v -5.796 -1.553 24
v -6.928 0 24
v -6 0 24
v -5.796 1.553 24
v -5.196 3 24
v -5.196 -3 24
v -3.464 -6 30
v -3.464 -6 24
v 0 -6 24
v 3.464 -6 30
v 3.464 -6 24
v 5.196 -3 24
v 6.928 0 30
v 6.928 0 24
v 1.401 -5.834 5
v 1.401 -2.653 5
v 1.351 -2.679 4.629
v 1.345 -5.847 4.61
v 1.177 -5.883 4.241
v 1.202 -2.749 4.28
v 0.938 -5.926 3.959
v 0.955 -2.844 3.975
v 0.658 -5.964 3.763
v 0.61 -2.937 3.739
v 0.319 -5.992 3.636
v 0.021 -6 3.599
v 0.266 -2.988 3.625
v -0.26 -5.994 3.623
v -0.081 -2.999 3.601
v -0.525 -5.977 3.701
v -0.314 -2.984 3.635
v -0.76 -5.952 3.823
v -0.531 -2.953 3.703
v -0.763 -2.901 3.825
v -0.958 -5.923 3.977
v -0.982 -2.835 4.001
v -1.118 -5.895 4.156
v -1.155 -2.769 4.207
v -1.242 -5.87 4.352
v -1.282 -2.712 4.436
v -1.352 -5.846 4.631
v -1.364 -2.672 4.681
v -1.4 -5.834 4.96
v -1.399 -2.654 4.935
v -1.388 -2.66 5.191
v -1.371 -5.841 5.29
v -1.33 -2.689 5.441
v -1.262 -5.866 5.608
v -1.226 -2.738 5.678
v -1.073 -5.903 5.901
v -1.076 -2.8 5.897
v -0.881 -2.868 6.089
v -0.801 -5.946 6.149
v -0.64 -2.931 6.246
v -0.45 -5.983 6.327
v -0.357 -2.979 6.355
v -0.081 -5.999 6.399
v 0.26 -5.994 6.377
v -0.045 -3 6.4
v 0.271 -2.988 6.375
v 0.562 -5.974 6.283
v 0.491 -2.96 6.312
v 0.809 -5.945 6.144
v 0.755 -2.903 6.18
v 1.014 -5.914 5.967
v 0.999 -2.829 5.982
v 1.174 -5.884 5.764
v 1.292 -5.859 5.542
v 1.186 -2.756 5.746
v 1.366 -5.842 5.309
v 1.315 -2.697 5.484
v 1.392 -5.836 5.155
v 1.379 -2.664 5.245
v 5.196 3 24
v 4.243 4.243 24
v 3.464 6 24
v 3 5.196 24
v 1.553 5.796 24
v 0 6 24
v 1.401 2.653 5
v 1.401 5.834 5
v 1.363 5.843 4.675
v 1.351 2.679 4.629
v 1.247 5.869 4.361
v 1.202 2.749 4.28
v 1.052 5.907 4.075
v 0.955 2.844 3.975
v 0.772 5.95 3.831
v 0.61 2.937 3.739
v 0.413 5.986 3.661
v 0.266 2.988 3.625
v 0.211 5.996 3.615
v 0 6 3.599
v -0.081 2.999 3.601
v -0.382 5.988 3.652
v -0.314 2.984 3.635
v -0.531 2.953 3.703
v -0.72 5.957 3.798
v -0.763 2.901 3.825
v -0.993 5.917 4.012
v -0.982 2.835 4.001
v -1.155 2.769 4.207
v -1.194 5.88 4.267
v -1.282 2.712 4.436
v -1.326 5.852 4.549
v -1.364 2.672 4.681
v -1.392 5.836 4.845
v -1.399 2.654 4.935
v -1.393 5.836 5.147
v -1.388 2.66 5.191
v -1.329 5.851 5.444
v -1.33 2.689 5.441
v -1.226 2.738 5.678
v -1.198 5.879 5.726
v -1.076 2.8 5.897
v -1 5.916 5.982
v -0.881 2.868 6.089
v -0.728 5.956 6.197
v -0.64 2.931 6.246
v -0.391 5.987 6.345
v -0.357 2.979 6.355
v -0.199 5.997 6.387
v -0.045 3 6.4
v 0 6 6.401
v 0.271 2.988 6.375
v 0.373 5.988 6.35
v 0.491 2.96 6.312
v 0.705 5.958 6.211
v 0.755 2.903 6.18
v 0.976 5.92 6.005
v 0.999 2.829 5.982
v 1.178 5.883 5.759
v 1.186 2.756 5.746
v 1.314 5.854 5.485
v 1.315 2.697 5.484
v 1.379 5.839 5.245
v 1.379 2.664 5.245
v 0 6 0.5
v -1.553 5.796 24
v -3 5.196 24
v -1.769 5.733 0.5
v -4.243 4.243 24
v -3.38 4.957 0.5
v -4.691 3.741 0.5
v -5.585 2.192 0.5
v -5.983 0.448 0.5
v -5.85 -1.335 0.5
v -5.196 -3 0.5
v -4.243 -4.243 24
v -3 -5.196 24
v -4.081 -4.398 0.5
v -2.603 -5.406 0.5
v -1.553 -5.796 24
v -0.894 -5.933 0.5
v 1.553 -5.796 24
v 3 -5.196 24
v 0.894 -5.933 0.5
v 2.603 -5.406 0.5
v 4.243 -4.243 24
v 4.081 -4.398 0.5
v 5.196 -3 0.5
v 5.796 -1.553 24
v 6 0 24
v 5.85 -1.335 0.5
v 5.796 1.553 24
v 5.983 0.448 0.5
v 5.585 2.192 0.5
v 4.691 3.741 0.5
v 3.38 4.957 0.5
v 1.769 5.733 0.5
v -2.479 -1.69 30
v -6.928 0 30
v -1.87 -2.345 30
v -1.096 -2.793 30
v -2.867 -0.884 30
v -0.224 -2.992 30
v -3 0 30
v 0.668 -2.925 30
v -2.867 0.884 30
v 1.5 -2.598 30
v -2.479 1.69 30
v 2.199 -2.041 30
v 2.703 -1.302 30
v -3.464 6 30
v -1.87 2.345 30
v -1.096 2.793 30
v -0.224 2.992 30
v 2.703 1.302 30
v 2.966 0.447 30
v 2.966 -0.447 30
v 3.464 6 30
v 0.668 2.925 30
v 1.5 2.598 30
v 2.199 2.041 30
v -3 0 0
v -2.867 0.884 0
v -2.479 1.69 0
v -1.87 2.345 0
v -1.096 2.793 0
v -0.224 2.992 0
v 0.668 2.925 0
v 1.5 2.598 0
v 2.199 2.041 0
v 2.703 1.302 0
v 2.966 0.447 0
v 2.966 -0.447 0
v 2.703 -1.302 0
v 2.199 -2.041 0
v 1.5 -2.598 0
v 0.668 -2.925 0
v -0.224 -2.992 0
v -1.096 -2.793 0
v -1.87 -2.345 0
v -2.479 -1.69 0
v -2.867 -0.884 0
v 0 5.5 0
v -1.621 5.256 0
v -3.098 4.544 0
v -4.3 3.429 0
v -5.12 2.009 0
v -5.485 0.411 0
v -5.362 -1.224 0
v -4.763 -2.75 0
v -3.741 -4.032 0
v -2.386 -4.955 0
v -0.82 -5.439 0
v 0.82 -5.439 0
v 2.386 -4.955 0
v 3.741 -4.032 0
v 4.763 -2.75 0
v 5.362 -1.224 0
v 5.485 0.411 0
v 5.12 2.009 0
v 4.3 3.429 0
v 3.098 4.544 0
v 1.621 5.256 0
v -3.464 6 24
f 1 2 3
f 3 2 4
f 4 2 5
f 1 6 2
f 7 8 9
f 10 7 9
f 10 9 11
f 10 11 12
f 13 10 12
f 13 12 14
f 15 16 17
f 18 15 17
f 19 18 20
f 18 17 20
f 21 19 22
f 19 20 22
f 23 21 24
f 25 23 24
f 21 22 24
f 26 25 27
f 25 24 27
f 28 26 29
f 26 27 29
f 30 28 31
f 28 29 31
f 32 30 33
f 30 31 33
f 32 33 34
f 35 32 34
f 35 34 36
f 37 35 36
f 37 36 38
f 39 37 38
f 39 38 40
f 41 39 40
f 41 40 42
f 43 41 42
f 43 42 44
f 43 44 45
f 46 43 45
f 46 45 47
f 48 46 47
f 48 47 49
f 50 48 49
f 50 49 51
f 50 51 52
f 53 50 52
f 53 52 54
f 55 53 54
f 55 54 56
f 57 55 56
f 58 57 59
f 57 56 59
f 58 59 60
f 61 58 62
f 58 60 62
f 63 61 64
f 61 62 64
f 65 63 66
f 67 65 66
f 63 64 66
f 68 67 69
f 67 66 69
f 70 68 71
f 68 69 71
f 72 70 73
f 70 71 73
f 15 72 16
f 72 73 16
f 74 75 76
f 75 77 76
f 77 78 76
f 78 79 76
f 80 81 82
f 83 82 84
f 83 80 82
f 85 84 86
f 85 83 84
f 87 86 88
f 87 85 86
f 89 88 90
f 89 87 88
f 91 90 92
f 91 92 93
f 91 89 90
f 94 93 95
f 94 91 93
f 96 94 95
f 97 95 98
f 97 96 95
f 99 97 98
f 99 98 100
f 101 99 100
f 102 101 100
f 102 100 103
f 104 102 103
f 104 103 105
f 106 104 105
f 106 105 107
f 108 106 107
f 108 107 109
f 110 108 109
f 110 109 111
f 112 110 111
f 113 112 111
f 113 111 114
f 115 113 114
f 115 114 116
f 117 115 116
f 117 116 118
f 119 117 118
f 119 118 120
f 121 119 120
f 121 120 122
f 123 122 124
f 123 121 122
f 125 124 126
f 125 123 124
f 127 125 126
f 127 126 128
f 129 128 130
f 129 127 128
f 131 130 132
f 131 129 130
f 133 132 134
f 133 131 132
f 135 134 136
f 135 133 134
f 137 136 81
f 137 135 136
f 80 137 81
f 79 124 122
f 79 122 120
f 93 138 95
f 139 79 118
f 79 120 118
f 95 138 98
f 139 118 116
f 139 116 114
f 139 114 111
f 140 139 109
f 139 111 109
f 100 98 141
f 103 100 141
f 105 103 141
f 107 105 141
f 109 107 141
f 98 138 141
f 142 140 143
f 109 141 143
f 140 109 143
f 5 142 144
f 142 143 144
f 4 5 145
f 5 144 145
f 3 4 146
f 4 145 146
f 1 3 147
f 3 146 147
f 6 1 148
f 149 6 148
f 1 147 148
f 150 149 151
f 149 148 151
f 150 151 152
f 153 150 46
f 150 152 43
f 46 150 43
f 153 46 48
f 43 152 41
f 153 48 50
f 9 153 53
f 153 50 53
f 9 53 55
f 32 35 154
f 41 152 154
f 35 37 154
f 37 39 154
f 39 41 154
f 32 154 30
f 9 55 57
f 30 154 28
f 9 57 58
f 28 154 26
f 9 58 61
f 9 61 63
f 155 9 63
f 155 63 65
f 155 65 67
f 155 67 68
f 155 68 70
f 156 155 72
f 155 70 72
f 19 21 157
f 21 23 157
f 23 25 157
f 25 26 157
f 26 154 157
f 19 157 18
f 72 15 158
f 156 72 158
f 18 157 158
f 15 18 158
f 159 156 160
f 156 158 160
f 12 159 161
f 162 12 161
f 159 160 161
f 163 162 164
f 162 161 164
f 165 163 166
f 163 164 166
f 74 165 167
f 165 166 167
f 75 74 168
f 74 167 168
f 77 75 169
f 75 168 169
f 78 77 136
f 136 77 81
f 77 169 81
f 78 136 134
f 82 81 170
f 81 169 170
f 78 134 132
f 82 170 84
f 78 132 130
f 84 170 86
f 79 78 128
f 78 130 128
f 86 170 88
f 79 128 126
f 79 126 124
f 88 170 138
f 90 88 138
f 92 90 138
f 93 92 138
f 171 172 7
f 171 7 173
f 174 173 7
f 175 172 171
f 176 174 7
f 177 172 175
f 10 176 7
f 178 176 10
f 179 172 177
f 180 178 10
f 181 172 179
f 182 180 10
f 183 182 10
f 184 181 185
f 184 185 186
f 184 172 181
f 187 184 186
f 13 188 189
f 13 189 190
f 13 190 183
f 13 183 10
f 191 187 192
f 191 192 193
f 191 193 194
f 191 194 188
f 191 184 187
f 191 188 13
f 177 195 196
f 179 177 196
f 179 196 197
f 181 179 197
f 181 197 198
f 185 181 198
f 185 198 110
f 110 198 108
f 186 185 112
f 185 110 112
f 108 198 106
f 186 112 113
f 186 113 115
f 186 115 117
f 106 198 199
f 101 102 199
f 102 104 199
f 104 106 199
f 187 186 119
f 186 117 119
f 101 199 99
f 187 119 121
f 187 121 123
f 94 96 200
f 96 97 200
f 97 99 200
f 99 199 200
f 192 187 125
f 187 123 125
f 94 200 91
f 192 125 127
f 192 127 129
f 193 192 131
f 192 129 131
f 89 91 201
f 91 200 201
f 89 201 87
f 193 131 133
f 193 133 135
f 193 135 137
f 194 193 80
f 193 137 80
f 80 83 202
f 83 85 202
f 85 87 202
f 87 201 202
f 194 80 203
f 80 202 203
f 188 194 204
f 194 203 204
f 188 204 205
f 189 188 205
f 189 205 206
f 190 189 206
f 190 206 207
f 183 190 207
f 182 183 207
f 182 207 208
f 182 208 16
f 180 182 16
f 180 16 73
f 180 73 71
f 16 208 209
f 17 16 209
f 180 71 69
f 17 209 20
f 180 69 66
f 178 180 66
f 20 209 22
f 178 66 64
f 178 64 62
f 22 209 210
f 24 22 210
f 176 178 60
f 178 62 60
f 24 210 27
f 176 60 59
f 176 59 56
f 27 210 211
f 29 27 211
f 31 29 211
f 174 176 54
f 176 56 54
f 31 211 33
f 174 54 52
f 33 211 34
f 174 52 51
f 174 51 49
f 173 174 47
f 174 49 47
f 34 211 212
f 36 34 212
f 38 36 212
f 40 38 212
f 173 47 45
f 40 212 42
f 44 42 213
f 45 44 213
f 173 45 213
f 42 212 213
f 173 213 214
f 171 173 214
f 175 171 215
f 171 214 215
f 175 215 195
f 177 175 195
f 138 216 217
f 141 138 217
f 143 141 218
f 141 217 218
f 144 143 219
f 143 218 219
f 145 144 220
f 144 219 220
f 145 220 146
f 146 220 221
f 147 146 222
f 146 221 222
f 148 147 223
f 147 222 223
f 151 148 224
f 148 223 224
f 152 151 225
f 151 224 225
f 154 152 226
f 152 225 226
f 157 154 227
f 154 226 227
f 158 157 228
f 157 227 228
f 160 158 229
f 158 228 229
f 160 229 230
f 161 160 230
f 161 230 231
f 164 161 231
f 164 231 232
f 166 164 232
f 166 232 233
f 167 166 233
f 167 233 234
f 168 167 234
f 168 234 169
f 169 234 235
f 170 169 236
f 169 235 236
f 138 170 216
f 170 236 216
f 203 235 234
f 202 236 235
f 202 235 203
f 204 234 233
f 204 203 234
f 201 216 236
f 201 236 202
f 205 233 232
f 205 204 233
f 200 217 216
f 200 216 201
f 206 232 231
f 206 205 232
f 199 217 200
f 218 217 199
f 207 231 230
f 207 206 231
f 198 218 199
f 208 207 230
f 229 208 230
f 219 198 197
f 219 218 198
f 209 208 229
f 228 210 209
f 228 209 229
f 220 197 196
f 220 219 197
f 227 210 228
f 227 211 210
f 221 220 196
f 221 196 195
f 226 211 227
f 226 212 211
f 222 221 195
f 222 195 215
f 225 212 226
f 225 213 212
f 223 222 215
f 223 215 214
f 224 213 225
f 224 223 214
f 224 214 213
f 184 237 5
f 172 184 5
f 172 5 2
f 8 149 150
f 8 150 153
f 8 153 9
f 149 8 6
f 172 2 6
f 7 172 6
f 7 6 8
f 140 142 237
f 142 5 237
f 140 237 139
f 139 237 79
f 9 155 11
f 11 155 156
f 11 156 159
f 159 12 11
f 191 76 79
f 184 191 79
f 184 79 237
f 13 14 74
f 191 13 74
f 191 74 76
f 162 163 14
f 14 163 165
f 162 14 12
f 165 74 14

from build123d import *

# Parameters (mm, degrees)
ESQUISSE1_W                  = 24
ESQUISSE1_H                  = 6
BOSS_EXTRU_1_DEPTH           = 6
ENL_V_MAT_EXTRU_1_REACH      = 32
ESQUISSE3_R                  = 3
ESQUISSE4_R                  = 1.400948466
ENL_V_MAT_EXTRU_2_DEPTH      = 7
ENL_V_MAT_EXTRU_2_DEPTH_BACK = 7
CHANFREIN1_SIZE              = 0.5


with BuildPart() as part:
    # Esquisse1 → Révolution1 (revolve)
    with BuildSketch(Plane(origin=(0, 0, 0), x_dir=(0, 0, -1), z_dir=(1, 0, 0))):
        with Locations((-12, 3)):
            Rectangle(ESQUISSE1_W, ESQUISSE1_H)
    revolve(axis=Axis((0, 0, 0), (0, 0, 1)))

    # Esquisse2 → Boss.-Extru.1 (add)
    with BuildSketch(Plane.XY.offset(24)):
        Polygon((6.92820323, 0), (3.464101615, 6), (-3.464101615, 6), (-6.92820323, 0), (-3.464101615, -6), (3.464101615, -6), align=None)
    extrude(amount=BOSS_EXTRU_1_DEPTH)

    # Esquisse3 → Enlèv. mat.-Extru.1 (cut, up to next)
    with BuildSketch(Plane(origin=(0, 0, 0), x_dir=(-1, 0, 0), z_dir=(0, 0, -1)), mode=Mode.PRIVATE) as enl_v_mat_extru_1_sk1:
        Circle(ESQUISSE3_R)
    enl_v_mat_extru_1_tool1 = extrude(enl_v_mat_extru_1_sk1.sketch, amount=-ENL_V_MAT_EXTRU_1_REACH, mode=Mode.PRIVATE) & part.part
    add(enl_v_mat_extru_1_tool1.solids().sort_by_distance((0, 0, 0))[0], mode=Mode.SUBTRACT)

    # Esquisse4 → Enlèv. mat.-Extru.2 (cut, two sides)
    with BuildSketch(Plane(origin=(0, 0, 0), x_dir=(1, 0, 0), z_dir=(0, 1, 0))) as enl_v_mat_extru_2_sk:
        with Locations((0, -5)):
            Circle(ESQUISSE4_R)
    extrude(amount=ENL_V_MAT_EXTRU_2_DEPTH, mode=Mode.SUBTRACT)
    extrude(enl_v_mat_extru_2_sk.sketch, amount=-ENL_V_MAT_EXTRU_2_DEPTH_BACK, mode=Mode.SUBTRACT)

    # Chanfrein1
    chanfrein1_edges = [part.edges().sort_by_distance(p)[0] for p in [
        (0, -6, 0),
    ]]
    chamfer(chanfrein1_edges, length=CHANFREIN1_SIZE)


solid = part.part
